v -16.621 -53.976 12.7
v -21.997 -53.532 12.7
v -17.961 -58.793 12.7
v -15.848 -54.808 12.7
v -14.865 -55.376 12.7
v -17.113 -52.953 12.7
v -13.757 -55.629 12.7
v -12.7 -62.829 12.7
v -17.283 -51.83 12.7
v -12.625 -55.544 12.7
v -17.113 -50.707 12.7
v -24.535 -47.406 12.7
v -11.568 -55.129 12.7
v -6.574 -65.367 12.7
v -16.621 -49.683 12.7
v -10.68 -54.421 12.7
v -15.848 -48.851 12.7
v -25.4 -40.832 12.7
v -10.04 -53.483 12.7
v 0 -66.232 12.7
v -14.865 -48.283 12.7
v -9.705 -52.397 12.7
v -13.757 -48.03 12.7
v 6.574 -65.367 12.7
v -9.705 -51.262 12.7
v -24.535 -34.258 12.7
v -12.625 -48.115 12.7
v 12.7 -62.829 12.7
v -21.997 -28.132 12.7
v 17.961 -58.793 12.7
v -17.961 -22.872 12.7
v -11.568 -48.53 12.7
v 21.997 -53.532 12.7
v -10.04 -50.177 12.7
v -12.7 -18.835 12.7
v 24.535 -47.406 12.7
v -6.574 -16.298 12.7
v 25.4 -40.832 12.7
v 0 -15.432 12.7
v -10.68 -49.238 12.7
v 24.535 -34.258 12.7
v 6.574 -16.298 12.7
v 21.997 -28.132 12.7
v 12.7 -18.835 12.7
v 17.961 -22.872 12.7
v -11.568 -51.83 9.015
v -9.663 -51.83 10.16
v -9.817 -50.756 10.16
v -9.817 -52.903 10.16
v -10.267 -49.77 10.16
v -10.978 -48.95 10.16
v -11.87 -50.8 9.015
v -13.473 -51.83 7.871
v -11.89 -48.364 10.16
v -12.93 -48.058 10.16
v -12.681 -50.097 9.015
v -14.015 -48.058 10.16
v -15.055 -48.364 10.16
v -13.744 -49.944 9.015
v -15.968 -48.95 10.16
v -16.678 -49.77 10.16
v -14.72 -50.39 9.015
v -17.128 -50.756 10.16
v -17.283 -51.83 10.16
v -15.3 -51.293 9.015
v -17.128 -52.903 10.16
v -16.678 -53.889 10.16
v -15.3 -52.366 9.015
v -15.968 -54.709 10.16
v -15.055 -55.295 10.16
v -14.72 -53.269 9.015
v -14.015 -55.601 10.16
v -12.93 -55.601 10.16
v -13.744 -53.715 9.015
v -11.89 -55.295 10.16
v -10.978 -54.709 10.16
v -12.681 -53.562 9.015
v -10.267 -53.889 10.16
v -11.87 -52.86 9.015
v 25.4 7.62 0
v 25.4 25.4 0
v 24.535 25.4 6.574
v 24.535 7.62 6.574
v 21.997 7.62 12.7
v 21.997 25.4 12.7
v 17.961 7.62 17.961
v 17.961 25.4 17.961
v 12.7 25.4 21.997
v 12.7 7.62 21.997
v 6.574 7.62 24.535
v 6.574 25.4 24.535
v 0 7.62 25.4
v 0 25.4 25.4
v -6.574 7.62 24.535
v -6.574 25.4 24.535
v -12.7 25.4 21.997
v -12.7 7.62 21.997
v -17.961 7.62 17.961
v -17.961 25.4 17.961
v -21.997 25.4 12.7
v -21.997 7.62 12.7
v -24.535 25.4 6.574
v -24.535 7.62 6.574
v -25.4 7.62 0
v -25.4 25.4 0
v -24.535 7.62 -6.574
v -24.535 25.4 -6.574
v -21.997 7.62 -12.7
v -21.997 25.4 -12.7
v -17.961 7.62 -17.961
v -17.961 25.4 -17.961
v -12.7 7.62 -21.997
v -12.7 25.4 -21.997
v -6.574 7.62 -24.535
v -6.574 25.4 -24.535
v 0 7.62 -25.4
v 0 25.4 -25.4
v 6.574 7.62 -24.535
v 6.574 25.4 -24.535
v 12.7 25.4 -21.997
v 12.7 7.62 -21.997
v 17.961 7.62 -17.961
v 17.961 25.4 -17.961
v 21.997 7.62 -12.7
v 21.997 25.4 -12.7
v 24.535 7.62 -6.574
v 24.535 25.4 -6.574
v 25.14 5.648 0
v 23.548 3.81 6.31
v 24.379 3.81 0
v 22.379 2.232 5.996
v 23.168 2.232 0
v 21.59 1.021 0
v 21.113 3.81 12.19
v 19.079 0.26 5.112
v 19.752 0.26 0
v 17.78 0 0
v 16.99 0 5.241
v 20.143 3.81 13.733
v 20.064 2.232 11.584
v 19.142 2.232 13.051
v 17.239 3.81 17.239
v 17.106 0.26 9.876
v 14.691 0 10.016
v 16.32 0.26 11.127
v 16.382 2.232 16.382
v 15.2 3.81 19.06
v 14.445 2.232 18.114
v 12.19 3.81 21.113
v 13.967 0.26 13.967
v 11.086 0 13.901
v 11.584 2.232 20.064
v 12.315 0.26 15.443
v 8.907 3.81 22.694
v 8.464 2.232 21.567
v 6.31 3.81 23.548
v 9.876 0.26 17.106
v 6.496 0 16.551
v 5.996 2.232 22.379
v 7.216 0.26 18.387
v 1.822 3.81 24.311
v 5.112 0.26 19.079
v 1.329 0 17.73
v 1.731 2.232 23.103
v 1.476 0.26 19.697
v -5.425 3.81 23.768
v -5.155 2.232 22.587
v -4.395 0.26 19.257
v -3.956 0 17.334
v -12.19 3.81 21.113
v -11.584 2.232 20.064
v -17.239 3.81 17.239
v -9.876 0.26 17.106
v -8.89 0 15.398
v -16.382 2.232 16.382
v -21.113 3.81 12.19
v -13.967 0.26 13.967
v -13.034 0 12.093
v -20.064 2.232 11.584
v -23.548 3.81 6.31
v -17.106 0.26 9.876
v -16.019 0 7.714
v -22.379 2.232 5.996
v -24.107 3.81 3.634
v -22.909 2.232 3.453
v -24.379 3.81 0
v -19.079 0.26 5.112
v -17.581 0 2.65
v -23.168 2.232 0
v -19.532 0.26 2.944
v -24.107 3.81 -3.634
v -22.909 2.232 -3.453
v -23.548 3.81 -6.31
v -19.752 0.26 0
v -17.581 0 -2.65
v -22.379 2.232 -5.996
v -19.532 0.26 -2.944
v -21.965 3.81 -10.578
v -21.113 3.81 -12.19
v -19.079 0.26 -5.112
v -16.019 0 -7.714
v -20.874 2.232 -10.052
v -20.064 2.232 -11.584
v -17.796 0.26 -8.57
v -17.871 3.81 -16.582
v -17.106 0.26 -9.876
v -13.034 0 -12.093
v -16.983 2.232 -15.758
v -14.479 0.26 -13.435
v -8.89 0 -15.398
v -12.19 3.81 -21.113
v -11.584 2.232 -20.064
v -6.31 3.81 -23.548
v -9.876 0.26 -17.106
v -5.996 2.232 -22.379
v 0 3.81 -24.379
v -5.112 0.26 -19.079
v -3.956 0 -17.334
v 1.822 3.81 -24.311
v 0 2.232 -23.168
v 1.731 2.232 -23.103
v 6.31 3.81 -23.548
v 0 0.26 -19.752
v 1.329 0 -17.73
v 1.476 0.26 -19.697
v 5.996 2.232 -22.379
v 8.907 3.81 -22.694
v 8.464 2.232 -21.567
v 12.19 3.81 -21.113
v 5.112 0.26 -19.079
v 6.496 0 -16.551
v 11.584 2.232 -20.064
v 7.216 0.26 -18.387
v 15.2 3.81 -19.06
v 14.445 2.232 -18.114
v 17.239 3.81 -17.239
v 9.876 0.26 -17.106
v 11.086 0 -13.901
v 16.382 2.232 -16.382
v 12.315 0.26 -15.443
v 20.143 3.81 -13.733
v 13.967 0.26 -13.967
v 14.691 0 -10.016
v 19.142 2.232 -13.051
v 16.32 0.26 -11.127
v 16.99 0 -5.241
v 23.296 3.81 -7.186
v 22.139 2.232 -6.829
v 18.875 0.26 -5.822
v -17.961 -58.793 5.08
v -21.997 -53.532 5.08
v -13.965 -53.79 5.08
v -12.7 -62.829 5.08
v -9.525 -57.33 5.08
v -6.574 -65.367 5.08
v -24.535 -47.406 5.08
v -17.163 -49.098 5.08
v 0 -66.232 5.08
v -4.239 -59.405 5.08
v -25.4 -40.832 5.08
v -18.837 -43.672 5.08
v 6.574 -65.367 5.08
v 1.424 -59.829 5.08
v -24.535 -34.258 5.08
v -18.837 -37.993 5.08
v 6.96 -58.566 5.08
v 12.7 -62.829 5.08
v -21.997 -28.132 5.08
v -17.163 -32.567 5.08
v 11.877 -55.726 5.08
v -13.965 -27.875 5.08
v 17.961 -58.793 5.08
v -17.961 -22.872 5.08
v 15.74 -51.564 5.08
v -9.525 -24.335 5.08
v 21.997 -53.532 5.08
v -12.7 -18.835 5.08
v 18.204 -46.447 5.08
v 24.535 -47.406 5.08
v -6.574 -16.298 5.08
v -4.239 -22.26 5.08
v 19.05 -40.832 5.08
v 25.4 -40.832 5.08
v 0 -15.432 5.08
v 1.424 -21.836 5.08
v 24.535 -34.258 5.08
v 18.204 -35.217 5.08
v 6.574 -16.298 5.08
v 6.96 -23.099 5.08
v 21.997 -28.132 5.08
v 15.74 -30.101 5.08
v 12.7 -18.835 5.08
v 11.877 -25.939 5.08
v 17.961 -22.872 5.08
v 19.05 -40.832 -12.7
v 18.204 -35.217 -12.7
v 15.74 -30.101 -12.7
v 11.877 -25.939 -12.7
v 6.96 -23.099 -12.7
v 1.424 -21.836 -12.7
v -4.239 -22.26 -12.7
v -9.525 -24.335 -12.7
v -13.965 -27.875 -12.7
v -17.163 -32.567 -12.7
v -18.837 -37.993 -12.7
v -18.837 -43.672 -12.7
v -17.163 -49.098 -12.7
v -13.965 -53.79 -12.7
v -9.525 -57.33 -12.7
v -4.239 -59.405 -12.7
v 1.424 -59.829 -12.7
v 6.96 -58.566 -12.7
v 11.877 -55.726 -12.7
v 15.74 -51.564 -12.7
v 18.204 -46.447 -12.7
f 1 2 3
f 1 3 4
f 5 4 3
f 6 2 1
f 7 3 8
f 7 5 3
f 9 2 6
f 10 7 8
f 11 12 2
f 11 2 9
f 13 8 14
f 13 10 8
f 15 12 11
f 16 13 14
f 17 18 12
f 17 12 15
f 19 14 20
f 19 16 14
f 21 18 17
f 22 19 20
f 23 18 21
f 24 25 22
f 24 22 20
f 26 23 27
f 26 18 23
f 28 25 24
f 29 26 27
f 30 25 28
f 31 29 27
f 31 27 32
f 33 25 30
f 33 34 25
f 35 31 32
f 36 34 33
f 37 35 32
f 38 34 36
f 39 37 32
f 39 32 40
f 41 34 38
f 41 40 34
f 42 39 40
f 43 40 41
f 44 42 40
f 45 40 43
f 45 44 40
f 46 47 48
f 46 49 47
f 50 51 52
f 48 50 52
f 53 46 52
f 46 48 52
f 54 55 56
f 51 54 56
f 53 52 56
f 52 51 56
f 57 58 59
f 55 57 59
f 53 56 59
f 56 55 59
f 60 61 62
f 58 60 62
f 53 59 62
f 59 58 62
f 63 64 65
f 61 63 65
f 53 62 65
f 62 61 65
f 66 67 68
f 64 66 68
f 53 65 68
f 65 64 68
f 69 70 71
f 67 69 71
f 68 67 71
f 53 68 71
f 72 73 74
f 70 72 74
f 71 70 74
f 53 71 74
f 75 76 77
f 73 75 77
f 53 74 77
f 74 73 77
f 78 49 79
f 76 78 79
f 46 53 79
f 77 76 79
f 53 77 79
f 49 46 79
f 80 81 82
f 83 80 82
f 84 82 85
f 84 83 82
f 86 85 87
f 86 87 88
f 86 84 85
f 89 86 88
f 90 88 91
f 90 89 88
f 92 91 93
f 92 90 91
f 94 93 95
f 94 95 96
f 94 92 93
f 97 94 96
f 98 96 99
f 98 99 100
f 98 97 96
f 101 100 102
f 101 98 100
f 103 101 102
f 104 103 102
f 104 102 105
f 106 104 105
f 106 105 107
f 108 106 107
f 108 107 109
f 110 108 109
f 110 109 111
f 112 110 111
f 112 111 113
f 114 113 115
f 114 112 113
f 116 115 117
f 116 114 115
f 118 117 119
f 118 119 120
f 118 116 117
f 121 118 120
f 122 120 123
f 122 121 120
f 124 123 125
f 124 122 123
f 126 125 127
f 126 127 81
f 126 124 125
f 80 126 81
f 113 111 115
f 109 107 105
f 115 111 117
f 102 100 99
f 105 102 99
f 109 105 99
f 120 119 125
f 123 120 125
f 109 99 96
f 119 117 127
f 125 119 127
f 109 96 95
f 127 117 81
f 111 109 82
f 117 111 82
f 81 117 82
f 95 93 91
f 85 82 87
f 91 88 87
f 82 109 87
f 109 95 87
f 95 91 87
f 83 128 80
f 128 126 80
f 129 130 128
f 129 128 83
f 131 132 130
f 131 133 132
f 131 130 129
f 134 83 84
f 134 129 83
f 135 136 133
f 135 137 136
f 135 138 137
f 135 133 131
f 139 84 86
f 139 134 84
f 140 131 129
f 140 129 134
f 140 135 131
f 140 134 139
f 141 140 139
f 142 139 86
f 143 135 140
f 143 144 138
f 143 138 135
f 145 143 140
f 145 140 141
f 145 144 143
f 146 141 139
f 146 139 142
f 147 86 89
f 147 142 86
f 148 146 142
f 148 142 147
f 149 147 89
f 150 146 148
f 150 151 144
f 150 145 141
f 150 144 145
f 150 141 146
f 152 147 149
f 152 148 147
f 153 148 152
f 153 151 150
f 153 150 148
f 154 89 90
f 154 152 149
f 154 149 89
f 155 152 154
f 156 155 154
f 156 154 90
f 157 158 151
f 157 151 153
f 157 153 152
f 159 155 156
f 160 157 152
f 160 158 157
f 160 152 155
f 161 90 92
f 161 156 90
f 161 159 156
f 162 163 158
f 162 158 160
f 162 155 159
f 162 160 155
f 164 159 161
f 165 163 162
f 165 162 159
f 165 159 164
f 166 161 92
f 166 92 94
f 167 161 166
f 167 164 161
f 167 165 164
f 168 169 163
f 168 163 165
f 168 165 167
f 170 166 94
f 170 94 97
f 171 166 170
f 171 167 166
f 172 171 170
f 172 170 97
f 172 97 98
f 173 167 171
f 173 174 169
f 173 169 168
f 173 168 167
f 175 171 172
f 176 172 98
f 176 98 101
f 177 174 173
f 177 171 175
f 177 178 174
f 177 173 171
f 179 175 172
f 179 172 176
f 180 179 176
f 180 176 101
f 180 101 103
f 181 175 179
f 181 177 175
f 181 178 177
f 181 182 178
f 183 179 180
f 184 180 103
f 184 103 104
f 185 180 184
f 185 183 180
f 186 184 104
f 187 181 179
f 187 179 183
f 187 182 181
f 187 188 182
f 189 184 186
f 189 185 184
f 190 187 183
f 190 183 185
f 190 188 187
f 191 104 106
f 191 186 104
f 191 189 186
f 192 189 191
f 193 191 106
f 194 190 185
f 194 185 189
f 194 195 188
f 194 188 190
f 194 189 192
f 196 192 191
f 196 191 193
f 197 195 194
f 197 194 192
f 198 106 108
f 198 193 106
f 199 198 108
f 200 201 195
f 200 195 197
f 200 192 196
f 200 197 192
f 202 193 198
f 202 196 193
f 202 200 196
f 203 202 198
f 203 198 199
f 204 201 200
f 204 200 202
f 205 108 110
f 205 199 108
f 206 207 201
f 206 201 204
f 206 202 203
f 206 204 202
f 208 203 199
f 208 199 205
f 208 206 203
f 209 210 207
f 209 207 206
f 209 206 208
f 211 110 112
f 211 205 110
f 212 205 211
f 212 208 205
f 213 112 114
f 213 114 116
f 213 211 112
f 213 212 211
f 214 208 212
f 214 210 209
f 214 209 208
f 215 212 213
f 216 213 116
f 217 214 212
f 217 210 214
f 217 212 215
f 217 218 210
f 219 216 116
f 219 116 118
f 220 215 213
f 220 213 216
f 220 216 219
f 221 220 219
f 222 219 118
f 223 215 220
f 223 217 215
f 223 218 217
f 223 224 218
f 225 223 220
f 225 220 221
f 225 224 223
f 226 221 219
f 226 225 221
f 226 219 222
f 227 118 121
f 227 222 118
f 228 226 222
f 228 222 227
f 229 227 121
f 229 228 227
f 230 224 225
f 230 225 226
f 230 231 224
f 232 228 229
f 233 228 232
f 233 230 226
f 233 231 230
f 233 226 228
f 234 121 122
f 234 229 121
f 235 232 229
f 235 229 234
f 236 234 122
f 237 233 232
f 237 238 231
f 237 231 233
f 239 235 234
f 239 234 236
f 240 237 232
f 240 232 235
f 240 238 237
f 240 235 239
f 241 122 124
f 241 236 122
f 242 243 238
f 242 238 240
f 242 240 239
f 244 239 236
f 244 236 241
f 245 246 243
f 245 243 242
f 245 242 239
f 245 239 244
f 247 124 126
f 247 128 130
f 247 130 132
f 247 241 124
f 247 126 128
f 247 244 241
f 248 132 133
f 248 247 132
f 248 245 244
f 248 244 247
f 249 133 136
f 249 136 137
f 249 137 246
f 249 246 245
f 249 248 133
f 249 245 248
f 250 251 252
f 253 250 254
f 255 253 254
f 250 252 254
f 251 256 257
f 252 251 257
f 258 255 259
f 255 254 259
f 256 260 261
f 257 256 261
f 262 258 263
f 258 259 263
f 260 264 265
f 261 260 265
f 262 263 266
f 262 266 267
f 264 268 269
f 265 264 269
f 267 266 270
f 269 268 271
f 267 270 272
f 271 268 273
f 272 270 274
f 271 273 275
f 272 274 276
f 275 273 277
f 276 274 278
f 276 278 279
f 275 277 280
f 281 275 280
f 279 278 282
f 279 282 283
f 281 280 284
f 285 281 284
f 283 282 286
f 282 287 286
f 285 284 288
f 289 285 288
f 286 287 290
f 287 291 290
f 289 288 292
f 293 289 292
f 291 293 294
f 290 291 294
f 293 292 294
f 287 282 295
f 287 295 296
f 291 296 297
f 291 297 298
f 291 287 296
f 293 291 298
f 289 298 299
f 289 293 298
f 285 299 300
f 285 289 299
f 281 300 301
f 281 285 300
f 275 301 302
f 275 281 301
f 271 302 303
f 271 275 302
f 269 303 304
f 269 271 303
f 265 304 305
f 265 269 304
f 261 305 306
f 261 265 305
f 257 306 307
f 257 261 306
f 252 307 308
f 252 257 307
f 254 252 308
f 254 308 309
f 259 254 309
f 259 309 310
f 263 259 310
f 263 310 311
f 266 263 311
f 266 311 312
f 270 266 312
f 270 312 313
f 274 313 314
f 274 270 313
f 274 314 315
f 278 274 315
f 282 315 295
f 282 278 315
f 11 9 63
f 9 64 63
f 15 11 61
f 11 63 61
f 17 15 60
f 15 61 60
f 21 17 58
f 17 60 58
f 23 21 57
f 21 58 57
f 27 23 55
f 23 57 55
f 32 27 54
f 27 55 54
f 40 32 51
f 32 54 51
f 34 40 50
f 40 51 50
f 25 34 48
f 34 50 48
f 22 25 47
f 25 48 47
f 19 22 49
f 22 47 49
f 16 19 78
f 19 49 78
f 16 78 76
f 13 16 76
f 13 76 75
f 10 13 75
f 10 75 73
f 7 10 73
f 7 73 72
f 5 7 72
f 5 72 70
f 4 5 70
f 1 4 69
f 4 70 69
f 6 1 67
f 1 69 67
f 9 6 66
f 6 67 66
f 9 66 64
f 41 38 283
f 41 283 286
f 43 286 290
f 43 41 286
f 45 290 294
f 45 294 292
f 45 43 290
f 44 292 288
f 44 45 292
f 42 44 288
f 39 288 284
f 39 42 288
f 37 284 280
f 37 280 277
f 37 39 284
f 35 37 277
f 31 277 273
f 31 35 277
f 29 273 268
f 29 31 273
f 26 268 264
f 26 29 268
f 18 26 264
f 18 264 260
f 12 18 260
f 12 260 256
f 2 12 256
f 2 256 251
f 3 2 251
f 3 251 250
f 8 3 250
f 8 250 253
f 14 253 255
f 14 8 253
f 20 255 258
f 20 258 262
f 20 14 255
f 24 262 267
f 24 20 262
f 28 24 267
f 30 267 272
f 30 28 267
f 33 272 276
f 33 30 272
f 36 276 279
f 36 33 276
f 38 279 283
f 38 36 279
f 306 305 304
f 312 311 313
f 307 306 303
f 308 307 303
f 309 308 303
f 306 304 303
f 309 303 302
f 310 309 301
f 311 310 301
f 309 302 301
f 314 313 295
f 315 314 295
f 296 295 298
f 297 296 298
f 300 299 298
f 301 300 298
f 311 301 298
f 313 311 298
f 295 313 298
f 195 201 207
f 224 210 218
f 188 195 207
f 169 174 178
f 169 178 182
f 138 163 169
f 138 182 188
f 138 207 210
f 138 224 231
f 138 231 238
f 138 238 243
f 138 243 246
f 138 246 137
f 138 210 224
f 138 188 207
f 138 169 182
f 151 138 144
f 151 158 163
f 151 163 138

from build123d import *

# Parameters (mm, degrees)
F0_R     = 25.4
F1_DEPTH = 25.4
F2_R     = 7.62
F3_R     = 19.05
F4_DEPTH = 12.7
F5_R     = 25.4
F5_R_2   = 19.05
F6_DEPTH = 7.62
F8_D     = 7.62
F8_DEPTH = 2.54
F8_TIP   = 2.2892789585


with BuildPart() as f1:
    # F0 (on Front) → F1 (new body)
    with BuildSketch(Plane.XZ):
        Circle(F0_R)
    extrude(amount=-F1_DEPTH)

    # F2
    f2_edges = [f1.edges().sort_by_distance(p)[0] for p in [
        (-25.4, 0, 0),
    ]]
    fillet(f2_edges, radius=F2_R)


with BuildPart() as f4:
    # F3 (on Top) → F4 (new body, symmetric)
    with BuildSketch(Plane.XY):
        with Locations((0, -40.8324053059)):
            Circle(F3_R)
    extrude(amount=F4_DEPTH, both=True)

    # F5 (on face) → F6 (join)
    with BuildSketch(Plane.XY.offset(12.7)):
        with Locations((0, -40.8324053059)):
            Circle(F5_R)
        with Locations((0, -40.8324053059)):
            Circle(F5_R_2, mode=Mode.SUBTRACT)
    extrude(amount=-F6_DEPTH)

    # F8
    with Locations(Plane.XY.offset(12.7)):
        with Locations((-13.4725943208, -51.8296062946)):
            Hole(F8_D / 2, depth=F8_DEPTH)
            with Locations((0, 0, -(F8_DEPTH + F8_TIP / 2))):  # 118° drill point
                Cone(0, F8_D / 2, F8_TIP, mode=Mode.SUBTRACT)


solid = Compound([f1.part, f4.part])
